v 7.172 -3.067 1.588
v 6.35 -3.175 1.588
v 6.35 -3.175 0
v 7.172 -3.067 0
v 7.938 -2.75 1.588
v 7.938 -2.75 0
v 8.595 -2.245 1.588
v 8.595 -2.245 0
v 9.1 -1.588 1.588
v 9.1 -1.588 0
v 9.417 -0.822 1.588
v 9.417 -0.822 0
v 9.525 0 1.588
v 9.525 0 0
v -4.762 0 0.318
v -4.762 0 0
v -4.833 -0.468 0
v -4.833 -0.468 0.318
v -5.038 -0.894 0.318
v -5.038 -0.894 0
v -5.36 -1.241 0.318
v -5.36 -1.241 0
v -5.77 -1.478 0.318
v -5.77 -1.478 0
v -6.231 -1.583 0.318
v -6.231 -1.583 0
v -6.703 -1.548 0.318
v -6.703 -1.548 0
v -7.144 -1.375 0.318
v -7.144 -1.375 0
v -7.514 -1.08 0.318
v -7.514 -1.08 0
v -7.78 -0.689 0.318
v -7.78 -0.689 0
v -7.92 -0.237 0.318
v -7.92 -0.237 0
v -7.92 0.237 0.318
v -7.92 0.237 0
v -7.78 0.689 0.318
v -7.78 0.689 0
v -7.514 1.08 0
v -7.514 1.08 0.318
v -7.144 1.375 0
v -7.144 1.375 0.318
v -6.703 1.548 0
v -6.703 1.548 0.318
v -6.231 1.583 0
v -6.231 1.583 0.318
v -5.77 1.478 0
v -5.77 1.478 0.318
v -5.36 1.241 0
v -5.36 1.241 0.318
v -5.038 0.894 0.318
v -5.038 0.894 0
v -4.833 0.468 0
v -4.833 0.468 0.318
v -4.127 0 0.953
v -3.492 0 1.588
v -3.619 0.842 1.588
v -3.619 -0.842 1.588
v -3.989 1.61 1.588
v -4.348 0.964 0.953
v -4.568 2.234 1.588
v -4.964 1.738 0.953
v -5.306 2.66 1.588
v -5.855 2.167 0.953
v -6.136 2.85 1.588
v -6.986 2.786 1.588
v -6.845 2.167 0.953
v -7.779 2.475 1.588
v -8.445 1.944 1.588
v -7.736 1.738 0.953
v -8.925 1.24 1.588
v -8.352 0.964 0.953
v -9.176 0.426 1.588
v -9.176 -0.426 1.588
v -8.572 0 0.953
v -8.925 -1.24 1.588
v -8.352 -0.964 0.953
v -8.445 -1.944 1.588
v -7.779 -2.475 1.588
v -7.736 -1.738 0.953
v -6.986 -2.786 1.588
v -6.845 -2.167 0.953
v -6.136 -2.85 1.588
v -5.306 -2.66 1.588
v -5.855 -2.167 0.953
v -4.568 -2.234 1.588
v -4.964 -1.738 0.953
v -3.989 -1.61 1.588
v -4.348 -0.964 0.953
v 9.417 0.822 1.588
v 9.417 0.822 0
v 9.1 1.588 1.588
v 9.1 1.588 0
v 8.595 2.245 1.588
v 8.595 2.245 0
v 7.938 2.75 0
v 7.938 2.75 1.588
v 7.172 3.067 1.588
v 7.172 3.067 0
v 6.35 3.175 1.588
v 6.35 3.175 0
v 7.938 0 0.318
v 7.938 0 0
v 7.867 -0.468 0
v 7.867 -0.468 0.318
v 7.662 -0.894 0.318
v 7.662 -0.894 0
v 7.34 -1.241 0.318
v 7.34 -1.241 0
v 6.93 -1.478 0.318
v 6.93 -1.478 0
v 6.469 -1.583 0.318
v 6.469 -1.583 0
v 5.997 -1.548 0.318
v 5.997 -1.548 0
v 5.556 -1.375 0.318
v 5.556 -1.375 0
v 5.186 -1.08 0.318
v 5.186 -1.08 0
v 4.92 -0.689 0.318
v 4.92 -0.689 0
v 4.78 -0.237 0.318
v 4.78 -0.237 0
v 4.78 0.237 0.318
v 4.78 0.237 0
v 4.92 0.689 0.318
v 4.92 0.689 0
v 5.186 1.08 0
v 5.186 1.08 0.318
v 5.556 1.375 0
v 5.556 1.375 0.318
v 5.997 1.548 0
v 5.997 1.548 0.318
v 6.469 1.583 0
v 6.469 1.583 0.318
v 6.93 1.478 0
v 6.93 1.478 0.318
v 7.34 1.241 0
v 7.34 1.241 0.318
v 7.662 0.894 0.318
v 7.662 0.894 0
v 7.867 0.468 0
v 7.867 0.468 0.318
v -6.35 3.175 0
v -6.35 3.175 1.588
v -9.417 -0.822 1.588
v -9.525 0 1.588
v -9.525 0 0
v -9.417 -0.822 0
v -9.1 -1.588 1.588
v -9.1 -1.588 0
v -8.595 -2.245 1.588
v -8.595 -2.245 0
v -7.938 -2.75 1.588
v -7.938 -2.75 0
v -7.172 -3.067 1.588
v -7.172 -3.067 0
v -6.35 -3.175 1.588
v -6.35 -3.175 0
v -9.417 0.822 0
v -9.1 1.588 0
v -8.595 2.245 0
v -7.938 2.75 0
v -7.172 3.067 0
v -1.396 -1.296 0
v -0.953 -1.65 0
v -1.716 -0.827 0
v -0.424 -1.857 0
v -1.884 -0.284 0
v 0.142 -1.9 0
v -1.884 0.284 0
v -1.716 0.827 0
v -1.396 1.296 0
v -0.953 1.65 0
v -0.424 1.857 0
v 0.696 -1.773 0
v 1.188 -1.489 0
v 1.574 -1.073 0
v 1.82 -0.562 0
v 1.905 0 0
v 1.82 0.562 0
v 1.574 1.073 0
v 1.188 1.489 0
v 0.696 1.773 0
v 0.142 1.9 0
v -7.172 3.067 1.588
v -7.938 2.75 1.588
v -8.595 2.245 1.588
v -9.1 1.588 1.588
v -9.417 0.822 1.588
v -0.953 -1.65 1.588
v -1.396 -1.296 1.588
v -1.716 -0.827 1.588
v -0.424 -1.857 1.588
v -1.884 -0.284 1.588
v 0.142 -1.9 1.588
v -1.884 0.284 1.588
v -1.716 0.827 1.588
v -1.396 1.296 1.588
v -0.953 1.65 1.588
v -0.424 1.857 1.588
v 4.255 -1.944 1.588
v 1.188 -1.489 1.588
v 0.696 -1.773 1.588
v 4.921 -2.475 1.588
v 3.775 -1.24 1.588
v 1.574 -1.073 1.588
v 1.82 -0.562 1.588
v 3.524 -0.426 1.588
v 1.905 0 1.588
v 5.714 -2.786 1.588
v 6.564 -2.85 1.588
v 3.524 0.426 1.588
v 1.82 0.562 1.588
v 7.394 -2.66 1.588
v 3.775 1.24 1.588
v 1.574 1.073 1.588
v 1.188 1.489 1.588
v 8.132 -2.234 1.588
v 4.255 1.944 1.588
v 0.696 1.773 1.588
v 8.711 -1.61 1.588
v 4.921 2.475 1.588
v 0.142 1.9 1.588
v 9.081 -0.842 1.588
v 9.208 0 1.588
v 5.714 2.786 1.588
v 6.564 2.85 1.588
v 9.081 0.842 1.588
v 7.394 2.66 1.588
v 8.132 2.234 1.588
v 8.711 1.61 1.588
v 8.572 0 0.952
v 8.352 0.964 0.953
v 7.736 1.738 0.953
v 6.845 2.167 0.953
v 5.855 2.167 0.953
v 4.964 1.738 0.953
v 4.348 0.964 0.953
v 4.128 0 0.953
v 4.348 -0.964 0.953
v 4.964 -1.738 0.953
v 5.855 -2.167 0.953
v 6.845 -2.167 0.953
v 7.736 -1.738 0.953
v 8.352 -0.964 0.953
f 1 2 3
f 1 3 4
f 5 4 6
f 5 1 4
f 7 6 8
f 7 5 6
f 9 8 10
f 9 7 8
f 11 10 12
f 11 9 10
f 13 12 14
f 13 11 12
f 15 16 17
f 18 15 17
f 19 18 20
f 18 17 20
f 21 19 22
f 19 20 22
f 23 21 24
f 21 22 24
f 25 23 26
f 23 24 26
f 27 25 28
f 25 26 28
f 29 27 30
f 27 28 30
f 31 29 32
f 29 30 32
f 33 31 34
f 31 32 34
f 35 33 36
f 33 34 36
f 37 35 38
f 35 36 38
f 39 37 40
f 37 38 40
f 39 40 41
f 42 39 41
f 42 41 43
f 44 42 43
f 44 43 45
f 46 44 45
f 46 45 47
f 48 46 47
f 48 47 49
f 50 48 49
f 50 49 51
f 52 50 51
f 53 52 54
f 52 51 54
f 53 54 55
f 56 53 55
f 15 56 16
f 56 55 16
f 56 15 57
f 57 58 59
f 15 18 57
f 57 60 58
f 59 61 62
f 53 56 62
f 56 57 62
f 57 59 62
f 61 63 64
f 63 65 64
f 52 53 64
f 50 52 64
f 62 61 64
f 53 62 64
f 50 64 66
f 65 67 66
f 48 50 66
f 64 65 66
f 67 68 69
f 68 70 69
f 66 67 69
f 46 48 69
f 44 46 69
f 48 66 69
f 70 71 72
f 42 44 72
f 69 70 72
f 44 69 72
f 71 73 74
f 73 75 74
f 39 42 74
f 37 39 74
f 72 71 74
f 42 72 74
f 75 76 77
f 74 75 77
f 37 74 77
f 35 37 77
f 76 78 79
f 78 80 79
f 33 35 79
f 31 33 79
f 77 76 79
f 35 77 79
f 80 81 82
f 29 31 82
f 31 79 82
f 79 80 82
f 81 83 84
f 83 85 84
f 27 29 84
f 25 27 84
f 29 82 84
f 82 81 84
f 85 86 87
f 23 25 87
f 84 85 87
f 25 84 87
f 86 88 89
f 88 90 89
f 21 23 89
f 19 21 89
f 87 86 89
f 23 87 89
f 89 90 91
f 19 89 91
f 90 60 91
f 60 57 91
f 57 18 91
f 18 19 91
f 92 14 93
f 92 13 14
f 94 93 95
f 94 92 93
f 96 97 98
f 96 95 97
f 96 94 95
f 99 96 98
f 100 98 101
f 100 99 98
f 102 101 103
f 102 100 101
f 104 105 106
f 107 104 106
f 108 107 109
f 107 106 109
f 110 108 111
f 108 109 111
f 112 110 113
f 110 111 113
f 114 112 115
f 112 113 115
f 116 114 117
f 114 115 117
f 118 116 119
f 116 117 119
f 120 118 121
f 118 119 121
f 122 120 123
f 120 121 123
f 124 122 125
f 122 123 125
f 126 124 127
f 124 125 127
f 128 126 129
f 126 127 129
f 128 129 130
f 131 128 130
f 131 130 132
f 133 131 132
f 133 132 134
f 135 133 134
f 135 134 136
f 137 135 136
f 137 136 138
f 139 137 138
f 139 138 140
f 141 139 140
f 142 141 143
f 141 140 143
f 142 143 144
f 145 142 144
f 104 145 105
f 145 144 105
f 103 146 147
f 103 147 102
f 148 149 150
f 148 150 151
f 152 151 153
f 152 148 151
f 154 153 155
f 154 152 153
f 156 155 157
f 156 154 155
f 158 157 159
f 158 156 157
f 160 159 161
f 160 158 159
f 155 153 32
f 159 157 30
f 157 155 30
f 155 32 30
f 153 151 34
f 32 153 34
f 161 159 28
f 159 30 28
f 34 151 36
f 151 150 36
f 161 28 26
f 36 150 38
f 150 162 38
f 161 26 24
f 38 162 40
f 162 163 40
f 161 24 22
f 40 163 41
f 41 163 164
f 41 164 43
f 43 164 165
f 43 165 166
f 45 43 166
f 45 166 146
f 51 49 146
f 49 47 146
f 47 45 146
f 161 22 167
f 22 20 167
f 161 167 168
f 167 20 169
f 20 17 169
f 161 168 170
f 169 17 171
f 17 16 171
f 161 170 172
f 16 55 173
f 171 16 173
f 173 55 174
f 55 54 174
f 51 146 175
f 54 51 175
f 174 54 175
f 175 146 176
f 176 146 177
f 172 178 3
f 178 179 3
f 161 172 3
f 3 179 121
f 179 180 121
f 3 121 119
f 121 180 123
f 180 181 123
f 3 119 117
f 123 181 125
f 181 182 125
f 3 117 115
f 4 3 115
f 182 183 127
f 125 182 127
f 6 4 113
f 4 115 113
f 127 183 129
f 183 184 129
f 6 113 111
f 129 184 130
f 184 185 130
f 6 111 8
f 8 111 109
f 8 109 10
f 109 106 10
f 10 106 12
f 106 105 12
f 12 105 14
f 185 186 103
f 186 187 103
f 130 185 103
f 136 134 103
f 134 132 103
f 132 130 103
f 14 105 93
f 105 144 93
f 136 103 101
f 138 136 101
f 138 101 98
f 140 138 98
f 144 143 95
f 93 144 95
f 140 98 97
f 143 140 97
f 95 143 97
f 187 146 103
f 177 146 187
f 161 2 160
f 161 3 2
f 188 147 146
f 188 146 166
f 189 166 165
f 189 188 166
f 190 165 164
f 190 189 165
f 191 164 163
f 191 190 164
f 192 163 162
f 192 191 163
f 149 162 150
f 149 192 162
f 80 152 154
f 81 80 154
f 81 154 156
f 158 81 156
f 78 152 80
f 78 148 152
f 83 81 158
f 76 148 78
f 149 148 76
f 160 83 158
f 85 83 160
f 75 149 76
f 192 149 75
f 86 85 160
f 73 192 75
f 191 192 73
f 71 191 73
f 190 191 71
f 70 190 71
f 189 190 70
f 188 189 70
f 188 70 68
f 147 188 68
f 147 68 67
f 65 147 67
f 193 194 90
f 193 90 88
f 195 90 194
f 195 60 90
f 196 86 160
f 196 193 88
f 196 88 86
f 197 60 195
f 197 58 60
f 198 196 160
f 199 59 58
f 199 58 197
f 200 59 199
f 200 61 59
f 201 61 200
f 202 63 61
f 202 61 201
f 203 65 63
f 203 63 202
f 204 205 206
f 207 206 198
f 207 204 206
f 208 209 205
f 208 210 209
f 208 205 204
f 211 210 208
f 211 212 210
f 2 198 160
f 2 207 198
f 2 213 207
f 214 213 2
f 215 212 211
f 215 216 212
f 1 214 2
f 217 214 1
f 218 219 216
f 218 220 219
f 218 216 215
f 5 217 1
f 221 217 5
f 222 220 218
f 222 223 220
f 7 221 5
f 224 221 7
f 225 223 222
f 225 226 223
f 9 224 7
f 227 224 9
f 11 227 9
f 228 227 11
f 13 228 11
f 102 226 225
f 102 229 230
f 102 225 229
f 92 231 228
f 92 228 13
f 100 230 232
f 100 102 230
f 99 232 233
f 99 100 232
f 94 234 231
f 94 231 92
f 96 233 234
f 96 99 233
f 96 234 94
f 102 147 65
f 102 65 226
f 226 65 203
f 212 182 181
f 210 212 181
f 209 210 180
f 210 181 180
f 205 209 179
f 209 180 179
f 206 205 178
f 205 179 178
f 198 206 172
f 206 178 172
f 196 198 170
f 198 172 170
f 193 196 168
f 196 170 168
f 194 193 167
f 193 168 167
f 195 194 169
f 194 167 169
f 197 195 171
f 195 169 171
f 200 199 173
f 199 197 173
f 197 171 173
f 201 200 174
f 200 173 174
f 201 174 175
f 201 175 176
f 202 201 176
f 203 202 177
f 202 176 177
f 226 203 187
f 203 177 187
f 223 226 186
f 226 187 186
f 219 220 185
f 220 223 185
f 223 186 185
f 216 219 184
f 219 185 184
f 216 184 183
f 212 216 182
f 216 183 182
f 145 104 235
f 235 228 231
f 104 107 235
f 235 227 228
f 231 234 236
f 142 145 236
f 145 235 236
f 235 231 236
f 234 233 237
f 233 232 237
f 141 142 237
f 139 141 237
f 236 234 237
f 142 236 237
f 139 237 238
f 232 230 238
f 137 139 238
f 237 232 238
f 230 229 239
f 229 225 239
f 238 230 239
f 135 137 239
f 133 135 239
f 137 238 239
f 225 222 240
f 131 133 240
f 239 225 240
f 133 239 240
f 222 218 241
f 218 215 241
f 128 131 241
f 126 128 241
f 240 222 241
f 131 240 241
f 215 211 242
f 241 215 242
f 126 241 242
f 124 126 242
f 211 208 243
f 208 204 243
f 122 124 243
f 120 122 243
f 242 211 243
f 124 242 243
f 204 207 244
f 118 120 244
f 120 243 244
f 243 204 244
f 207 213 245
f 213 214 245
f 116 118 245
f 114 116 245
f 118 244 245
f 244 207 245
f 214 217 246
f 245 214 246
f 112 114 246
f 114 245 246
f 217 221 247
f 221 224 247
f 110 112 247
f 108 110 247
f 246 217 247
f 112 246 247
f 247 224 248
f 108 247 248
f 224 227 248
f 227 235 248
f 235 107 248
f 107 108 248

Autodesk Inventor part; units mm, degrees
ref_plane "YZ Plane" through (0, 0, 0) normal (1, 0, 0) x (0, 1, 0)
ref_plane "XZ Plane" through (0, 0, 0) normal (0, 1, 0) x (-1, 0, 0)
ref_plane "XY Plane" through (0, 0, 0) normal (0, 0, 1) x (1, 0, 0)
sketch "Sketch1" plane through (0, 0, 0) normal (0, 0, 1) x (1, 0, 0)
  circle A0 centre (0, 0) radius 1.905
  line L0 (0, 0) -> (6.35, 0)
  line L1 (6.35, 0) -> (-6.35, 0)
  circle A1 centre (-6.35, 0) radius 1.5875
  circle A2 centre (6.35, 0) radius 1.5875
  line L2 (-9.525, 3.175) -> (9.525, 3.175)
  line L3 (9.525, 3.175) -> (9.525, -3.175)
  line L4 (9.525, -3.175) -> (-9.525, -3.175)
  line L5 (-9.525, -3.175) -> (-9.525, 3.175)
  dimension "d0" = 3.81
  dimension "d1" = 6.35
  dimension "d2" = 12.7
  dimension "d3" = 3.175
  dimension "d4" = 3.175
  dimension "d5" = 19.05
  dimension "d6" = 9.525
  dimension "d7" = 6.35
  dimension "d8" = 3.175
sketch "Sketch1 outline for Extrusion1" plane through (0, 0, 0) normal (0, 0, 1) x (1, 0, 0)
  line L0 (-9.525, 3.175) -> (9.525, 3.175)
  line L1 (-9.525, -3.175) -> (-9.525, 3.175)
  line L2 (9.525, 3.175) -> (9.525, -3.175)
  line L3 (9.525, -3.175) -> (-9.525, -3.175)
  circle A0 centre (-6.35, 0) radius 1.5875
  circle A1 centre (0, 0) radius 1.905
  circle A2 centre (6.35, 0) radius 1.5875
extrude "Extrusion1" add sketch "Sketch1 outline for Extrusion1" along normal blind 1.5875
chamfer "Chamfer1" distance 1.27 angle 45 2 edges at (-7.9375, 0, 1.5875) (4.7625, 0, 1.5875)
fillet "Fillet1" radius 3.175 4 edges at (-9.525, 3.175, 0.7937) (-9.525, -3.175, 0.7937) (9.525, -3.175, 0.7937) (9.525, 3.175, 0.7937)
properties part number "pushSwitchBushingHolderRear" material "ABS Plastic"
